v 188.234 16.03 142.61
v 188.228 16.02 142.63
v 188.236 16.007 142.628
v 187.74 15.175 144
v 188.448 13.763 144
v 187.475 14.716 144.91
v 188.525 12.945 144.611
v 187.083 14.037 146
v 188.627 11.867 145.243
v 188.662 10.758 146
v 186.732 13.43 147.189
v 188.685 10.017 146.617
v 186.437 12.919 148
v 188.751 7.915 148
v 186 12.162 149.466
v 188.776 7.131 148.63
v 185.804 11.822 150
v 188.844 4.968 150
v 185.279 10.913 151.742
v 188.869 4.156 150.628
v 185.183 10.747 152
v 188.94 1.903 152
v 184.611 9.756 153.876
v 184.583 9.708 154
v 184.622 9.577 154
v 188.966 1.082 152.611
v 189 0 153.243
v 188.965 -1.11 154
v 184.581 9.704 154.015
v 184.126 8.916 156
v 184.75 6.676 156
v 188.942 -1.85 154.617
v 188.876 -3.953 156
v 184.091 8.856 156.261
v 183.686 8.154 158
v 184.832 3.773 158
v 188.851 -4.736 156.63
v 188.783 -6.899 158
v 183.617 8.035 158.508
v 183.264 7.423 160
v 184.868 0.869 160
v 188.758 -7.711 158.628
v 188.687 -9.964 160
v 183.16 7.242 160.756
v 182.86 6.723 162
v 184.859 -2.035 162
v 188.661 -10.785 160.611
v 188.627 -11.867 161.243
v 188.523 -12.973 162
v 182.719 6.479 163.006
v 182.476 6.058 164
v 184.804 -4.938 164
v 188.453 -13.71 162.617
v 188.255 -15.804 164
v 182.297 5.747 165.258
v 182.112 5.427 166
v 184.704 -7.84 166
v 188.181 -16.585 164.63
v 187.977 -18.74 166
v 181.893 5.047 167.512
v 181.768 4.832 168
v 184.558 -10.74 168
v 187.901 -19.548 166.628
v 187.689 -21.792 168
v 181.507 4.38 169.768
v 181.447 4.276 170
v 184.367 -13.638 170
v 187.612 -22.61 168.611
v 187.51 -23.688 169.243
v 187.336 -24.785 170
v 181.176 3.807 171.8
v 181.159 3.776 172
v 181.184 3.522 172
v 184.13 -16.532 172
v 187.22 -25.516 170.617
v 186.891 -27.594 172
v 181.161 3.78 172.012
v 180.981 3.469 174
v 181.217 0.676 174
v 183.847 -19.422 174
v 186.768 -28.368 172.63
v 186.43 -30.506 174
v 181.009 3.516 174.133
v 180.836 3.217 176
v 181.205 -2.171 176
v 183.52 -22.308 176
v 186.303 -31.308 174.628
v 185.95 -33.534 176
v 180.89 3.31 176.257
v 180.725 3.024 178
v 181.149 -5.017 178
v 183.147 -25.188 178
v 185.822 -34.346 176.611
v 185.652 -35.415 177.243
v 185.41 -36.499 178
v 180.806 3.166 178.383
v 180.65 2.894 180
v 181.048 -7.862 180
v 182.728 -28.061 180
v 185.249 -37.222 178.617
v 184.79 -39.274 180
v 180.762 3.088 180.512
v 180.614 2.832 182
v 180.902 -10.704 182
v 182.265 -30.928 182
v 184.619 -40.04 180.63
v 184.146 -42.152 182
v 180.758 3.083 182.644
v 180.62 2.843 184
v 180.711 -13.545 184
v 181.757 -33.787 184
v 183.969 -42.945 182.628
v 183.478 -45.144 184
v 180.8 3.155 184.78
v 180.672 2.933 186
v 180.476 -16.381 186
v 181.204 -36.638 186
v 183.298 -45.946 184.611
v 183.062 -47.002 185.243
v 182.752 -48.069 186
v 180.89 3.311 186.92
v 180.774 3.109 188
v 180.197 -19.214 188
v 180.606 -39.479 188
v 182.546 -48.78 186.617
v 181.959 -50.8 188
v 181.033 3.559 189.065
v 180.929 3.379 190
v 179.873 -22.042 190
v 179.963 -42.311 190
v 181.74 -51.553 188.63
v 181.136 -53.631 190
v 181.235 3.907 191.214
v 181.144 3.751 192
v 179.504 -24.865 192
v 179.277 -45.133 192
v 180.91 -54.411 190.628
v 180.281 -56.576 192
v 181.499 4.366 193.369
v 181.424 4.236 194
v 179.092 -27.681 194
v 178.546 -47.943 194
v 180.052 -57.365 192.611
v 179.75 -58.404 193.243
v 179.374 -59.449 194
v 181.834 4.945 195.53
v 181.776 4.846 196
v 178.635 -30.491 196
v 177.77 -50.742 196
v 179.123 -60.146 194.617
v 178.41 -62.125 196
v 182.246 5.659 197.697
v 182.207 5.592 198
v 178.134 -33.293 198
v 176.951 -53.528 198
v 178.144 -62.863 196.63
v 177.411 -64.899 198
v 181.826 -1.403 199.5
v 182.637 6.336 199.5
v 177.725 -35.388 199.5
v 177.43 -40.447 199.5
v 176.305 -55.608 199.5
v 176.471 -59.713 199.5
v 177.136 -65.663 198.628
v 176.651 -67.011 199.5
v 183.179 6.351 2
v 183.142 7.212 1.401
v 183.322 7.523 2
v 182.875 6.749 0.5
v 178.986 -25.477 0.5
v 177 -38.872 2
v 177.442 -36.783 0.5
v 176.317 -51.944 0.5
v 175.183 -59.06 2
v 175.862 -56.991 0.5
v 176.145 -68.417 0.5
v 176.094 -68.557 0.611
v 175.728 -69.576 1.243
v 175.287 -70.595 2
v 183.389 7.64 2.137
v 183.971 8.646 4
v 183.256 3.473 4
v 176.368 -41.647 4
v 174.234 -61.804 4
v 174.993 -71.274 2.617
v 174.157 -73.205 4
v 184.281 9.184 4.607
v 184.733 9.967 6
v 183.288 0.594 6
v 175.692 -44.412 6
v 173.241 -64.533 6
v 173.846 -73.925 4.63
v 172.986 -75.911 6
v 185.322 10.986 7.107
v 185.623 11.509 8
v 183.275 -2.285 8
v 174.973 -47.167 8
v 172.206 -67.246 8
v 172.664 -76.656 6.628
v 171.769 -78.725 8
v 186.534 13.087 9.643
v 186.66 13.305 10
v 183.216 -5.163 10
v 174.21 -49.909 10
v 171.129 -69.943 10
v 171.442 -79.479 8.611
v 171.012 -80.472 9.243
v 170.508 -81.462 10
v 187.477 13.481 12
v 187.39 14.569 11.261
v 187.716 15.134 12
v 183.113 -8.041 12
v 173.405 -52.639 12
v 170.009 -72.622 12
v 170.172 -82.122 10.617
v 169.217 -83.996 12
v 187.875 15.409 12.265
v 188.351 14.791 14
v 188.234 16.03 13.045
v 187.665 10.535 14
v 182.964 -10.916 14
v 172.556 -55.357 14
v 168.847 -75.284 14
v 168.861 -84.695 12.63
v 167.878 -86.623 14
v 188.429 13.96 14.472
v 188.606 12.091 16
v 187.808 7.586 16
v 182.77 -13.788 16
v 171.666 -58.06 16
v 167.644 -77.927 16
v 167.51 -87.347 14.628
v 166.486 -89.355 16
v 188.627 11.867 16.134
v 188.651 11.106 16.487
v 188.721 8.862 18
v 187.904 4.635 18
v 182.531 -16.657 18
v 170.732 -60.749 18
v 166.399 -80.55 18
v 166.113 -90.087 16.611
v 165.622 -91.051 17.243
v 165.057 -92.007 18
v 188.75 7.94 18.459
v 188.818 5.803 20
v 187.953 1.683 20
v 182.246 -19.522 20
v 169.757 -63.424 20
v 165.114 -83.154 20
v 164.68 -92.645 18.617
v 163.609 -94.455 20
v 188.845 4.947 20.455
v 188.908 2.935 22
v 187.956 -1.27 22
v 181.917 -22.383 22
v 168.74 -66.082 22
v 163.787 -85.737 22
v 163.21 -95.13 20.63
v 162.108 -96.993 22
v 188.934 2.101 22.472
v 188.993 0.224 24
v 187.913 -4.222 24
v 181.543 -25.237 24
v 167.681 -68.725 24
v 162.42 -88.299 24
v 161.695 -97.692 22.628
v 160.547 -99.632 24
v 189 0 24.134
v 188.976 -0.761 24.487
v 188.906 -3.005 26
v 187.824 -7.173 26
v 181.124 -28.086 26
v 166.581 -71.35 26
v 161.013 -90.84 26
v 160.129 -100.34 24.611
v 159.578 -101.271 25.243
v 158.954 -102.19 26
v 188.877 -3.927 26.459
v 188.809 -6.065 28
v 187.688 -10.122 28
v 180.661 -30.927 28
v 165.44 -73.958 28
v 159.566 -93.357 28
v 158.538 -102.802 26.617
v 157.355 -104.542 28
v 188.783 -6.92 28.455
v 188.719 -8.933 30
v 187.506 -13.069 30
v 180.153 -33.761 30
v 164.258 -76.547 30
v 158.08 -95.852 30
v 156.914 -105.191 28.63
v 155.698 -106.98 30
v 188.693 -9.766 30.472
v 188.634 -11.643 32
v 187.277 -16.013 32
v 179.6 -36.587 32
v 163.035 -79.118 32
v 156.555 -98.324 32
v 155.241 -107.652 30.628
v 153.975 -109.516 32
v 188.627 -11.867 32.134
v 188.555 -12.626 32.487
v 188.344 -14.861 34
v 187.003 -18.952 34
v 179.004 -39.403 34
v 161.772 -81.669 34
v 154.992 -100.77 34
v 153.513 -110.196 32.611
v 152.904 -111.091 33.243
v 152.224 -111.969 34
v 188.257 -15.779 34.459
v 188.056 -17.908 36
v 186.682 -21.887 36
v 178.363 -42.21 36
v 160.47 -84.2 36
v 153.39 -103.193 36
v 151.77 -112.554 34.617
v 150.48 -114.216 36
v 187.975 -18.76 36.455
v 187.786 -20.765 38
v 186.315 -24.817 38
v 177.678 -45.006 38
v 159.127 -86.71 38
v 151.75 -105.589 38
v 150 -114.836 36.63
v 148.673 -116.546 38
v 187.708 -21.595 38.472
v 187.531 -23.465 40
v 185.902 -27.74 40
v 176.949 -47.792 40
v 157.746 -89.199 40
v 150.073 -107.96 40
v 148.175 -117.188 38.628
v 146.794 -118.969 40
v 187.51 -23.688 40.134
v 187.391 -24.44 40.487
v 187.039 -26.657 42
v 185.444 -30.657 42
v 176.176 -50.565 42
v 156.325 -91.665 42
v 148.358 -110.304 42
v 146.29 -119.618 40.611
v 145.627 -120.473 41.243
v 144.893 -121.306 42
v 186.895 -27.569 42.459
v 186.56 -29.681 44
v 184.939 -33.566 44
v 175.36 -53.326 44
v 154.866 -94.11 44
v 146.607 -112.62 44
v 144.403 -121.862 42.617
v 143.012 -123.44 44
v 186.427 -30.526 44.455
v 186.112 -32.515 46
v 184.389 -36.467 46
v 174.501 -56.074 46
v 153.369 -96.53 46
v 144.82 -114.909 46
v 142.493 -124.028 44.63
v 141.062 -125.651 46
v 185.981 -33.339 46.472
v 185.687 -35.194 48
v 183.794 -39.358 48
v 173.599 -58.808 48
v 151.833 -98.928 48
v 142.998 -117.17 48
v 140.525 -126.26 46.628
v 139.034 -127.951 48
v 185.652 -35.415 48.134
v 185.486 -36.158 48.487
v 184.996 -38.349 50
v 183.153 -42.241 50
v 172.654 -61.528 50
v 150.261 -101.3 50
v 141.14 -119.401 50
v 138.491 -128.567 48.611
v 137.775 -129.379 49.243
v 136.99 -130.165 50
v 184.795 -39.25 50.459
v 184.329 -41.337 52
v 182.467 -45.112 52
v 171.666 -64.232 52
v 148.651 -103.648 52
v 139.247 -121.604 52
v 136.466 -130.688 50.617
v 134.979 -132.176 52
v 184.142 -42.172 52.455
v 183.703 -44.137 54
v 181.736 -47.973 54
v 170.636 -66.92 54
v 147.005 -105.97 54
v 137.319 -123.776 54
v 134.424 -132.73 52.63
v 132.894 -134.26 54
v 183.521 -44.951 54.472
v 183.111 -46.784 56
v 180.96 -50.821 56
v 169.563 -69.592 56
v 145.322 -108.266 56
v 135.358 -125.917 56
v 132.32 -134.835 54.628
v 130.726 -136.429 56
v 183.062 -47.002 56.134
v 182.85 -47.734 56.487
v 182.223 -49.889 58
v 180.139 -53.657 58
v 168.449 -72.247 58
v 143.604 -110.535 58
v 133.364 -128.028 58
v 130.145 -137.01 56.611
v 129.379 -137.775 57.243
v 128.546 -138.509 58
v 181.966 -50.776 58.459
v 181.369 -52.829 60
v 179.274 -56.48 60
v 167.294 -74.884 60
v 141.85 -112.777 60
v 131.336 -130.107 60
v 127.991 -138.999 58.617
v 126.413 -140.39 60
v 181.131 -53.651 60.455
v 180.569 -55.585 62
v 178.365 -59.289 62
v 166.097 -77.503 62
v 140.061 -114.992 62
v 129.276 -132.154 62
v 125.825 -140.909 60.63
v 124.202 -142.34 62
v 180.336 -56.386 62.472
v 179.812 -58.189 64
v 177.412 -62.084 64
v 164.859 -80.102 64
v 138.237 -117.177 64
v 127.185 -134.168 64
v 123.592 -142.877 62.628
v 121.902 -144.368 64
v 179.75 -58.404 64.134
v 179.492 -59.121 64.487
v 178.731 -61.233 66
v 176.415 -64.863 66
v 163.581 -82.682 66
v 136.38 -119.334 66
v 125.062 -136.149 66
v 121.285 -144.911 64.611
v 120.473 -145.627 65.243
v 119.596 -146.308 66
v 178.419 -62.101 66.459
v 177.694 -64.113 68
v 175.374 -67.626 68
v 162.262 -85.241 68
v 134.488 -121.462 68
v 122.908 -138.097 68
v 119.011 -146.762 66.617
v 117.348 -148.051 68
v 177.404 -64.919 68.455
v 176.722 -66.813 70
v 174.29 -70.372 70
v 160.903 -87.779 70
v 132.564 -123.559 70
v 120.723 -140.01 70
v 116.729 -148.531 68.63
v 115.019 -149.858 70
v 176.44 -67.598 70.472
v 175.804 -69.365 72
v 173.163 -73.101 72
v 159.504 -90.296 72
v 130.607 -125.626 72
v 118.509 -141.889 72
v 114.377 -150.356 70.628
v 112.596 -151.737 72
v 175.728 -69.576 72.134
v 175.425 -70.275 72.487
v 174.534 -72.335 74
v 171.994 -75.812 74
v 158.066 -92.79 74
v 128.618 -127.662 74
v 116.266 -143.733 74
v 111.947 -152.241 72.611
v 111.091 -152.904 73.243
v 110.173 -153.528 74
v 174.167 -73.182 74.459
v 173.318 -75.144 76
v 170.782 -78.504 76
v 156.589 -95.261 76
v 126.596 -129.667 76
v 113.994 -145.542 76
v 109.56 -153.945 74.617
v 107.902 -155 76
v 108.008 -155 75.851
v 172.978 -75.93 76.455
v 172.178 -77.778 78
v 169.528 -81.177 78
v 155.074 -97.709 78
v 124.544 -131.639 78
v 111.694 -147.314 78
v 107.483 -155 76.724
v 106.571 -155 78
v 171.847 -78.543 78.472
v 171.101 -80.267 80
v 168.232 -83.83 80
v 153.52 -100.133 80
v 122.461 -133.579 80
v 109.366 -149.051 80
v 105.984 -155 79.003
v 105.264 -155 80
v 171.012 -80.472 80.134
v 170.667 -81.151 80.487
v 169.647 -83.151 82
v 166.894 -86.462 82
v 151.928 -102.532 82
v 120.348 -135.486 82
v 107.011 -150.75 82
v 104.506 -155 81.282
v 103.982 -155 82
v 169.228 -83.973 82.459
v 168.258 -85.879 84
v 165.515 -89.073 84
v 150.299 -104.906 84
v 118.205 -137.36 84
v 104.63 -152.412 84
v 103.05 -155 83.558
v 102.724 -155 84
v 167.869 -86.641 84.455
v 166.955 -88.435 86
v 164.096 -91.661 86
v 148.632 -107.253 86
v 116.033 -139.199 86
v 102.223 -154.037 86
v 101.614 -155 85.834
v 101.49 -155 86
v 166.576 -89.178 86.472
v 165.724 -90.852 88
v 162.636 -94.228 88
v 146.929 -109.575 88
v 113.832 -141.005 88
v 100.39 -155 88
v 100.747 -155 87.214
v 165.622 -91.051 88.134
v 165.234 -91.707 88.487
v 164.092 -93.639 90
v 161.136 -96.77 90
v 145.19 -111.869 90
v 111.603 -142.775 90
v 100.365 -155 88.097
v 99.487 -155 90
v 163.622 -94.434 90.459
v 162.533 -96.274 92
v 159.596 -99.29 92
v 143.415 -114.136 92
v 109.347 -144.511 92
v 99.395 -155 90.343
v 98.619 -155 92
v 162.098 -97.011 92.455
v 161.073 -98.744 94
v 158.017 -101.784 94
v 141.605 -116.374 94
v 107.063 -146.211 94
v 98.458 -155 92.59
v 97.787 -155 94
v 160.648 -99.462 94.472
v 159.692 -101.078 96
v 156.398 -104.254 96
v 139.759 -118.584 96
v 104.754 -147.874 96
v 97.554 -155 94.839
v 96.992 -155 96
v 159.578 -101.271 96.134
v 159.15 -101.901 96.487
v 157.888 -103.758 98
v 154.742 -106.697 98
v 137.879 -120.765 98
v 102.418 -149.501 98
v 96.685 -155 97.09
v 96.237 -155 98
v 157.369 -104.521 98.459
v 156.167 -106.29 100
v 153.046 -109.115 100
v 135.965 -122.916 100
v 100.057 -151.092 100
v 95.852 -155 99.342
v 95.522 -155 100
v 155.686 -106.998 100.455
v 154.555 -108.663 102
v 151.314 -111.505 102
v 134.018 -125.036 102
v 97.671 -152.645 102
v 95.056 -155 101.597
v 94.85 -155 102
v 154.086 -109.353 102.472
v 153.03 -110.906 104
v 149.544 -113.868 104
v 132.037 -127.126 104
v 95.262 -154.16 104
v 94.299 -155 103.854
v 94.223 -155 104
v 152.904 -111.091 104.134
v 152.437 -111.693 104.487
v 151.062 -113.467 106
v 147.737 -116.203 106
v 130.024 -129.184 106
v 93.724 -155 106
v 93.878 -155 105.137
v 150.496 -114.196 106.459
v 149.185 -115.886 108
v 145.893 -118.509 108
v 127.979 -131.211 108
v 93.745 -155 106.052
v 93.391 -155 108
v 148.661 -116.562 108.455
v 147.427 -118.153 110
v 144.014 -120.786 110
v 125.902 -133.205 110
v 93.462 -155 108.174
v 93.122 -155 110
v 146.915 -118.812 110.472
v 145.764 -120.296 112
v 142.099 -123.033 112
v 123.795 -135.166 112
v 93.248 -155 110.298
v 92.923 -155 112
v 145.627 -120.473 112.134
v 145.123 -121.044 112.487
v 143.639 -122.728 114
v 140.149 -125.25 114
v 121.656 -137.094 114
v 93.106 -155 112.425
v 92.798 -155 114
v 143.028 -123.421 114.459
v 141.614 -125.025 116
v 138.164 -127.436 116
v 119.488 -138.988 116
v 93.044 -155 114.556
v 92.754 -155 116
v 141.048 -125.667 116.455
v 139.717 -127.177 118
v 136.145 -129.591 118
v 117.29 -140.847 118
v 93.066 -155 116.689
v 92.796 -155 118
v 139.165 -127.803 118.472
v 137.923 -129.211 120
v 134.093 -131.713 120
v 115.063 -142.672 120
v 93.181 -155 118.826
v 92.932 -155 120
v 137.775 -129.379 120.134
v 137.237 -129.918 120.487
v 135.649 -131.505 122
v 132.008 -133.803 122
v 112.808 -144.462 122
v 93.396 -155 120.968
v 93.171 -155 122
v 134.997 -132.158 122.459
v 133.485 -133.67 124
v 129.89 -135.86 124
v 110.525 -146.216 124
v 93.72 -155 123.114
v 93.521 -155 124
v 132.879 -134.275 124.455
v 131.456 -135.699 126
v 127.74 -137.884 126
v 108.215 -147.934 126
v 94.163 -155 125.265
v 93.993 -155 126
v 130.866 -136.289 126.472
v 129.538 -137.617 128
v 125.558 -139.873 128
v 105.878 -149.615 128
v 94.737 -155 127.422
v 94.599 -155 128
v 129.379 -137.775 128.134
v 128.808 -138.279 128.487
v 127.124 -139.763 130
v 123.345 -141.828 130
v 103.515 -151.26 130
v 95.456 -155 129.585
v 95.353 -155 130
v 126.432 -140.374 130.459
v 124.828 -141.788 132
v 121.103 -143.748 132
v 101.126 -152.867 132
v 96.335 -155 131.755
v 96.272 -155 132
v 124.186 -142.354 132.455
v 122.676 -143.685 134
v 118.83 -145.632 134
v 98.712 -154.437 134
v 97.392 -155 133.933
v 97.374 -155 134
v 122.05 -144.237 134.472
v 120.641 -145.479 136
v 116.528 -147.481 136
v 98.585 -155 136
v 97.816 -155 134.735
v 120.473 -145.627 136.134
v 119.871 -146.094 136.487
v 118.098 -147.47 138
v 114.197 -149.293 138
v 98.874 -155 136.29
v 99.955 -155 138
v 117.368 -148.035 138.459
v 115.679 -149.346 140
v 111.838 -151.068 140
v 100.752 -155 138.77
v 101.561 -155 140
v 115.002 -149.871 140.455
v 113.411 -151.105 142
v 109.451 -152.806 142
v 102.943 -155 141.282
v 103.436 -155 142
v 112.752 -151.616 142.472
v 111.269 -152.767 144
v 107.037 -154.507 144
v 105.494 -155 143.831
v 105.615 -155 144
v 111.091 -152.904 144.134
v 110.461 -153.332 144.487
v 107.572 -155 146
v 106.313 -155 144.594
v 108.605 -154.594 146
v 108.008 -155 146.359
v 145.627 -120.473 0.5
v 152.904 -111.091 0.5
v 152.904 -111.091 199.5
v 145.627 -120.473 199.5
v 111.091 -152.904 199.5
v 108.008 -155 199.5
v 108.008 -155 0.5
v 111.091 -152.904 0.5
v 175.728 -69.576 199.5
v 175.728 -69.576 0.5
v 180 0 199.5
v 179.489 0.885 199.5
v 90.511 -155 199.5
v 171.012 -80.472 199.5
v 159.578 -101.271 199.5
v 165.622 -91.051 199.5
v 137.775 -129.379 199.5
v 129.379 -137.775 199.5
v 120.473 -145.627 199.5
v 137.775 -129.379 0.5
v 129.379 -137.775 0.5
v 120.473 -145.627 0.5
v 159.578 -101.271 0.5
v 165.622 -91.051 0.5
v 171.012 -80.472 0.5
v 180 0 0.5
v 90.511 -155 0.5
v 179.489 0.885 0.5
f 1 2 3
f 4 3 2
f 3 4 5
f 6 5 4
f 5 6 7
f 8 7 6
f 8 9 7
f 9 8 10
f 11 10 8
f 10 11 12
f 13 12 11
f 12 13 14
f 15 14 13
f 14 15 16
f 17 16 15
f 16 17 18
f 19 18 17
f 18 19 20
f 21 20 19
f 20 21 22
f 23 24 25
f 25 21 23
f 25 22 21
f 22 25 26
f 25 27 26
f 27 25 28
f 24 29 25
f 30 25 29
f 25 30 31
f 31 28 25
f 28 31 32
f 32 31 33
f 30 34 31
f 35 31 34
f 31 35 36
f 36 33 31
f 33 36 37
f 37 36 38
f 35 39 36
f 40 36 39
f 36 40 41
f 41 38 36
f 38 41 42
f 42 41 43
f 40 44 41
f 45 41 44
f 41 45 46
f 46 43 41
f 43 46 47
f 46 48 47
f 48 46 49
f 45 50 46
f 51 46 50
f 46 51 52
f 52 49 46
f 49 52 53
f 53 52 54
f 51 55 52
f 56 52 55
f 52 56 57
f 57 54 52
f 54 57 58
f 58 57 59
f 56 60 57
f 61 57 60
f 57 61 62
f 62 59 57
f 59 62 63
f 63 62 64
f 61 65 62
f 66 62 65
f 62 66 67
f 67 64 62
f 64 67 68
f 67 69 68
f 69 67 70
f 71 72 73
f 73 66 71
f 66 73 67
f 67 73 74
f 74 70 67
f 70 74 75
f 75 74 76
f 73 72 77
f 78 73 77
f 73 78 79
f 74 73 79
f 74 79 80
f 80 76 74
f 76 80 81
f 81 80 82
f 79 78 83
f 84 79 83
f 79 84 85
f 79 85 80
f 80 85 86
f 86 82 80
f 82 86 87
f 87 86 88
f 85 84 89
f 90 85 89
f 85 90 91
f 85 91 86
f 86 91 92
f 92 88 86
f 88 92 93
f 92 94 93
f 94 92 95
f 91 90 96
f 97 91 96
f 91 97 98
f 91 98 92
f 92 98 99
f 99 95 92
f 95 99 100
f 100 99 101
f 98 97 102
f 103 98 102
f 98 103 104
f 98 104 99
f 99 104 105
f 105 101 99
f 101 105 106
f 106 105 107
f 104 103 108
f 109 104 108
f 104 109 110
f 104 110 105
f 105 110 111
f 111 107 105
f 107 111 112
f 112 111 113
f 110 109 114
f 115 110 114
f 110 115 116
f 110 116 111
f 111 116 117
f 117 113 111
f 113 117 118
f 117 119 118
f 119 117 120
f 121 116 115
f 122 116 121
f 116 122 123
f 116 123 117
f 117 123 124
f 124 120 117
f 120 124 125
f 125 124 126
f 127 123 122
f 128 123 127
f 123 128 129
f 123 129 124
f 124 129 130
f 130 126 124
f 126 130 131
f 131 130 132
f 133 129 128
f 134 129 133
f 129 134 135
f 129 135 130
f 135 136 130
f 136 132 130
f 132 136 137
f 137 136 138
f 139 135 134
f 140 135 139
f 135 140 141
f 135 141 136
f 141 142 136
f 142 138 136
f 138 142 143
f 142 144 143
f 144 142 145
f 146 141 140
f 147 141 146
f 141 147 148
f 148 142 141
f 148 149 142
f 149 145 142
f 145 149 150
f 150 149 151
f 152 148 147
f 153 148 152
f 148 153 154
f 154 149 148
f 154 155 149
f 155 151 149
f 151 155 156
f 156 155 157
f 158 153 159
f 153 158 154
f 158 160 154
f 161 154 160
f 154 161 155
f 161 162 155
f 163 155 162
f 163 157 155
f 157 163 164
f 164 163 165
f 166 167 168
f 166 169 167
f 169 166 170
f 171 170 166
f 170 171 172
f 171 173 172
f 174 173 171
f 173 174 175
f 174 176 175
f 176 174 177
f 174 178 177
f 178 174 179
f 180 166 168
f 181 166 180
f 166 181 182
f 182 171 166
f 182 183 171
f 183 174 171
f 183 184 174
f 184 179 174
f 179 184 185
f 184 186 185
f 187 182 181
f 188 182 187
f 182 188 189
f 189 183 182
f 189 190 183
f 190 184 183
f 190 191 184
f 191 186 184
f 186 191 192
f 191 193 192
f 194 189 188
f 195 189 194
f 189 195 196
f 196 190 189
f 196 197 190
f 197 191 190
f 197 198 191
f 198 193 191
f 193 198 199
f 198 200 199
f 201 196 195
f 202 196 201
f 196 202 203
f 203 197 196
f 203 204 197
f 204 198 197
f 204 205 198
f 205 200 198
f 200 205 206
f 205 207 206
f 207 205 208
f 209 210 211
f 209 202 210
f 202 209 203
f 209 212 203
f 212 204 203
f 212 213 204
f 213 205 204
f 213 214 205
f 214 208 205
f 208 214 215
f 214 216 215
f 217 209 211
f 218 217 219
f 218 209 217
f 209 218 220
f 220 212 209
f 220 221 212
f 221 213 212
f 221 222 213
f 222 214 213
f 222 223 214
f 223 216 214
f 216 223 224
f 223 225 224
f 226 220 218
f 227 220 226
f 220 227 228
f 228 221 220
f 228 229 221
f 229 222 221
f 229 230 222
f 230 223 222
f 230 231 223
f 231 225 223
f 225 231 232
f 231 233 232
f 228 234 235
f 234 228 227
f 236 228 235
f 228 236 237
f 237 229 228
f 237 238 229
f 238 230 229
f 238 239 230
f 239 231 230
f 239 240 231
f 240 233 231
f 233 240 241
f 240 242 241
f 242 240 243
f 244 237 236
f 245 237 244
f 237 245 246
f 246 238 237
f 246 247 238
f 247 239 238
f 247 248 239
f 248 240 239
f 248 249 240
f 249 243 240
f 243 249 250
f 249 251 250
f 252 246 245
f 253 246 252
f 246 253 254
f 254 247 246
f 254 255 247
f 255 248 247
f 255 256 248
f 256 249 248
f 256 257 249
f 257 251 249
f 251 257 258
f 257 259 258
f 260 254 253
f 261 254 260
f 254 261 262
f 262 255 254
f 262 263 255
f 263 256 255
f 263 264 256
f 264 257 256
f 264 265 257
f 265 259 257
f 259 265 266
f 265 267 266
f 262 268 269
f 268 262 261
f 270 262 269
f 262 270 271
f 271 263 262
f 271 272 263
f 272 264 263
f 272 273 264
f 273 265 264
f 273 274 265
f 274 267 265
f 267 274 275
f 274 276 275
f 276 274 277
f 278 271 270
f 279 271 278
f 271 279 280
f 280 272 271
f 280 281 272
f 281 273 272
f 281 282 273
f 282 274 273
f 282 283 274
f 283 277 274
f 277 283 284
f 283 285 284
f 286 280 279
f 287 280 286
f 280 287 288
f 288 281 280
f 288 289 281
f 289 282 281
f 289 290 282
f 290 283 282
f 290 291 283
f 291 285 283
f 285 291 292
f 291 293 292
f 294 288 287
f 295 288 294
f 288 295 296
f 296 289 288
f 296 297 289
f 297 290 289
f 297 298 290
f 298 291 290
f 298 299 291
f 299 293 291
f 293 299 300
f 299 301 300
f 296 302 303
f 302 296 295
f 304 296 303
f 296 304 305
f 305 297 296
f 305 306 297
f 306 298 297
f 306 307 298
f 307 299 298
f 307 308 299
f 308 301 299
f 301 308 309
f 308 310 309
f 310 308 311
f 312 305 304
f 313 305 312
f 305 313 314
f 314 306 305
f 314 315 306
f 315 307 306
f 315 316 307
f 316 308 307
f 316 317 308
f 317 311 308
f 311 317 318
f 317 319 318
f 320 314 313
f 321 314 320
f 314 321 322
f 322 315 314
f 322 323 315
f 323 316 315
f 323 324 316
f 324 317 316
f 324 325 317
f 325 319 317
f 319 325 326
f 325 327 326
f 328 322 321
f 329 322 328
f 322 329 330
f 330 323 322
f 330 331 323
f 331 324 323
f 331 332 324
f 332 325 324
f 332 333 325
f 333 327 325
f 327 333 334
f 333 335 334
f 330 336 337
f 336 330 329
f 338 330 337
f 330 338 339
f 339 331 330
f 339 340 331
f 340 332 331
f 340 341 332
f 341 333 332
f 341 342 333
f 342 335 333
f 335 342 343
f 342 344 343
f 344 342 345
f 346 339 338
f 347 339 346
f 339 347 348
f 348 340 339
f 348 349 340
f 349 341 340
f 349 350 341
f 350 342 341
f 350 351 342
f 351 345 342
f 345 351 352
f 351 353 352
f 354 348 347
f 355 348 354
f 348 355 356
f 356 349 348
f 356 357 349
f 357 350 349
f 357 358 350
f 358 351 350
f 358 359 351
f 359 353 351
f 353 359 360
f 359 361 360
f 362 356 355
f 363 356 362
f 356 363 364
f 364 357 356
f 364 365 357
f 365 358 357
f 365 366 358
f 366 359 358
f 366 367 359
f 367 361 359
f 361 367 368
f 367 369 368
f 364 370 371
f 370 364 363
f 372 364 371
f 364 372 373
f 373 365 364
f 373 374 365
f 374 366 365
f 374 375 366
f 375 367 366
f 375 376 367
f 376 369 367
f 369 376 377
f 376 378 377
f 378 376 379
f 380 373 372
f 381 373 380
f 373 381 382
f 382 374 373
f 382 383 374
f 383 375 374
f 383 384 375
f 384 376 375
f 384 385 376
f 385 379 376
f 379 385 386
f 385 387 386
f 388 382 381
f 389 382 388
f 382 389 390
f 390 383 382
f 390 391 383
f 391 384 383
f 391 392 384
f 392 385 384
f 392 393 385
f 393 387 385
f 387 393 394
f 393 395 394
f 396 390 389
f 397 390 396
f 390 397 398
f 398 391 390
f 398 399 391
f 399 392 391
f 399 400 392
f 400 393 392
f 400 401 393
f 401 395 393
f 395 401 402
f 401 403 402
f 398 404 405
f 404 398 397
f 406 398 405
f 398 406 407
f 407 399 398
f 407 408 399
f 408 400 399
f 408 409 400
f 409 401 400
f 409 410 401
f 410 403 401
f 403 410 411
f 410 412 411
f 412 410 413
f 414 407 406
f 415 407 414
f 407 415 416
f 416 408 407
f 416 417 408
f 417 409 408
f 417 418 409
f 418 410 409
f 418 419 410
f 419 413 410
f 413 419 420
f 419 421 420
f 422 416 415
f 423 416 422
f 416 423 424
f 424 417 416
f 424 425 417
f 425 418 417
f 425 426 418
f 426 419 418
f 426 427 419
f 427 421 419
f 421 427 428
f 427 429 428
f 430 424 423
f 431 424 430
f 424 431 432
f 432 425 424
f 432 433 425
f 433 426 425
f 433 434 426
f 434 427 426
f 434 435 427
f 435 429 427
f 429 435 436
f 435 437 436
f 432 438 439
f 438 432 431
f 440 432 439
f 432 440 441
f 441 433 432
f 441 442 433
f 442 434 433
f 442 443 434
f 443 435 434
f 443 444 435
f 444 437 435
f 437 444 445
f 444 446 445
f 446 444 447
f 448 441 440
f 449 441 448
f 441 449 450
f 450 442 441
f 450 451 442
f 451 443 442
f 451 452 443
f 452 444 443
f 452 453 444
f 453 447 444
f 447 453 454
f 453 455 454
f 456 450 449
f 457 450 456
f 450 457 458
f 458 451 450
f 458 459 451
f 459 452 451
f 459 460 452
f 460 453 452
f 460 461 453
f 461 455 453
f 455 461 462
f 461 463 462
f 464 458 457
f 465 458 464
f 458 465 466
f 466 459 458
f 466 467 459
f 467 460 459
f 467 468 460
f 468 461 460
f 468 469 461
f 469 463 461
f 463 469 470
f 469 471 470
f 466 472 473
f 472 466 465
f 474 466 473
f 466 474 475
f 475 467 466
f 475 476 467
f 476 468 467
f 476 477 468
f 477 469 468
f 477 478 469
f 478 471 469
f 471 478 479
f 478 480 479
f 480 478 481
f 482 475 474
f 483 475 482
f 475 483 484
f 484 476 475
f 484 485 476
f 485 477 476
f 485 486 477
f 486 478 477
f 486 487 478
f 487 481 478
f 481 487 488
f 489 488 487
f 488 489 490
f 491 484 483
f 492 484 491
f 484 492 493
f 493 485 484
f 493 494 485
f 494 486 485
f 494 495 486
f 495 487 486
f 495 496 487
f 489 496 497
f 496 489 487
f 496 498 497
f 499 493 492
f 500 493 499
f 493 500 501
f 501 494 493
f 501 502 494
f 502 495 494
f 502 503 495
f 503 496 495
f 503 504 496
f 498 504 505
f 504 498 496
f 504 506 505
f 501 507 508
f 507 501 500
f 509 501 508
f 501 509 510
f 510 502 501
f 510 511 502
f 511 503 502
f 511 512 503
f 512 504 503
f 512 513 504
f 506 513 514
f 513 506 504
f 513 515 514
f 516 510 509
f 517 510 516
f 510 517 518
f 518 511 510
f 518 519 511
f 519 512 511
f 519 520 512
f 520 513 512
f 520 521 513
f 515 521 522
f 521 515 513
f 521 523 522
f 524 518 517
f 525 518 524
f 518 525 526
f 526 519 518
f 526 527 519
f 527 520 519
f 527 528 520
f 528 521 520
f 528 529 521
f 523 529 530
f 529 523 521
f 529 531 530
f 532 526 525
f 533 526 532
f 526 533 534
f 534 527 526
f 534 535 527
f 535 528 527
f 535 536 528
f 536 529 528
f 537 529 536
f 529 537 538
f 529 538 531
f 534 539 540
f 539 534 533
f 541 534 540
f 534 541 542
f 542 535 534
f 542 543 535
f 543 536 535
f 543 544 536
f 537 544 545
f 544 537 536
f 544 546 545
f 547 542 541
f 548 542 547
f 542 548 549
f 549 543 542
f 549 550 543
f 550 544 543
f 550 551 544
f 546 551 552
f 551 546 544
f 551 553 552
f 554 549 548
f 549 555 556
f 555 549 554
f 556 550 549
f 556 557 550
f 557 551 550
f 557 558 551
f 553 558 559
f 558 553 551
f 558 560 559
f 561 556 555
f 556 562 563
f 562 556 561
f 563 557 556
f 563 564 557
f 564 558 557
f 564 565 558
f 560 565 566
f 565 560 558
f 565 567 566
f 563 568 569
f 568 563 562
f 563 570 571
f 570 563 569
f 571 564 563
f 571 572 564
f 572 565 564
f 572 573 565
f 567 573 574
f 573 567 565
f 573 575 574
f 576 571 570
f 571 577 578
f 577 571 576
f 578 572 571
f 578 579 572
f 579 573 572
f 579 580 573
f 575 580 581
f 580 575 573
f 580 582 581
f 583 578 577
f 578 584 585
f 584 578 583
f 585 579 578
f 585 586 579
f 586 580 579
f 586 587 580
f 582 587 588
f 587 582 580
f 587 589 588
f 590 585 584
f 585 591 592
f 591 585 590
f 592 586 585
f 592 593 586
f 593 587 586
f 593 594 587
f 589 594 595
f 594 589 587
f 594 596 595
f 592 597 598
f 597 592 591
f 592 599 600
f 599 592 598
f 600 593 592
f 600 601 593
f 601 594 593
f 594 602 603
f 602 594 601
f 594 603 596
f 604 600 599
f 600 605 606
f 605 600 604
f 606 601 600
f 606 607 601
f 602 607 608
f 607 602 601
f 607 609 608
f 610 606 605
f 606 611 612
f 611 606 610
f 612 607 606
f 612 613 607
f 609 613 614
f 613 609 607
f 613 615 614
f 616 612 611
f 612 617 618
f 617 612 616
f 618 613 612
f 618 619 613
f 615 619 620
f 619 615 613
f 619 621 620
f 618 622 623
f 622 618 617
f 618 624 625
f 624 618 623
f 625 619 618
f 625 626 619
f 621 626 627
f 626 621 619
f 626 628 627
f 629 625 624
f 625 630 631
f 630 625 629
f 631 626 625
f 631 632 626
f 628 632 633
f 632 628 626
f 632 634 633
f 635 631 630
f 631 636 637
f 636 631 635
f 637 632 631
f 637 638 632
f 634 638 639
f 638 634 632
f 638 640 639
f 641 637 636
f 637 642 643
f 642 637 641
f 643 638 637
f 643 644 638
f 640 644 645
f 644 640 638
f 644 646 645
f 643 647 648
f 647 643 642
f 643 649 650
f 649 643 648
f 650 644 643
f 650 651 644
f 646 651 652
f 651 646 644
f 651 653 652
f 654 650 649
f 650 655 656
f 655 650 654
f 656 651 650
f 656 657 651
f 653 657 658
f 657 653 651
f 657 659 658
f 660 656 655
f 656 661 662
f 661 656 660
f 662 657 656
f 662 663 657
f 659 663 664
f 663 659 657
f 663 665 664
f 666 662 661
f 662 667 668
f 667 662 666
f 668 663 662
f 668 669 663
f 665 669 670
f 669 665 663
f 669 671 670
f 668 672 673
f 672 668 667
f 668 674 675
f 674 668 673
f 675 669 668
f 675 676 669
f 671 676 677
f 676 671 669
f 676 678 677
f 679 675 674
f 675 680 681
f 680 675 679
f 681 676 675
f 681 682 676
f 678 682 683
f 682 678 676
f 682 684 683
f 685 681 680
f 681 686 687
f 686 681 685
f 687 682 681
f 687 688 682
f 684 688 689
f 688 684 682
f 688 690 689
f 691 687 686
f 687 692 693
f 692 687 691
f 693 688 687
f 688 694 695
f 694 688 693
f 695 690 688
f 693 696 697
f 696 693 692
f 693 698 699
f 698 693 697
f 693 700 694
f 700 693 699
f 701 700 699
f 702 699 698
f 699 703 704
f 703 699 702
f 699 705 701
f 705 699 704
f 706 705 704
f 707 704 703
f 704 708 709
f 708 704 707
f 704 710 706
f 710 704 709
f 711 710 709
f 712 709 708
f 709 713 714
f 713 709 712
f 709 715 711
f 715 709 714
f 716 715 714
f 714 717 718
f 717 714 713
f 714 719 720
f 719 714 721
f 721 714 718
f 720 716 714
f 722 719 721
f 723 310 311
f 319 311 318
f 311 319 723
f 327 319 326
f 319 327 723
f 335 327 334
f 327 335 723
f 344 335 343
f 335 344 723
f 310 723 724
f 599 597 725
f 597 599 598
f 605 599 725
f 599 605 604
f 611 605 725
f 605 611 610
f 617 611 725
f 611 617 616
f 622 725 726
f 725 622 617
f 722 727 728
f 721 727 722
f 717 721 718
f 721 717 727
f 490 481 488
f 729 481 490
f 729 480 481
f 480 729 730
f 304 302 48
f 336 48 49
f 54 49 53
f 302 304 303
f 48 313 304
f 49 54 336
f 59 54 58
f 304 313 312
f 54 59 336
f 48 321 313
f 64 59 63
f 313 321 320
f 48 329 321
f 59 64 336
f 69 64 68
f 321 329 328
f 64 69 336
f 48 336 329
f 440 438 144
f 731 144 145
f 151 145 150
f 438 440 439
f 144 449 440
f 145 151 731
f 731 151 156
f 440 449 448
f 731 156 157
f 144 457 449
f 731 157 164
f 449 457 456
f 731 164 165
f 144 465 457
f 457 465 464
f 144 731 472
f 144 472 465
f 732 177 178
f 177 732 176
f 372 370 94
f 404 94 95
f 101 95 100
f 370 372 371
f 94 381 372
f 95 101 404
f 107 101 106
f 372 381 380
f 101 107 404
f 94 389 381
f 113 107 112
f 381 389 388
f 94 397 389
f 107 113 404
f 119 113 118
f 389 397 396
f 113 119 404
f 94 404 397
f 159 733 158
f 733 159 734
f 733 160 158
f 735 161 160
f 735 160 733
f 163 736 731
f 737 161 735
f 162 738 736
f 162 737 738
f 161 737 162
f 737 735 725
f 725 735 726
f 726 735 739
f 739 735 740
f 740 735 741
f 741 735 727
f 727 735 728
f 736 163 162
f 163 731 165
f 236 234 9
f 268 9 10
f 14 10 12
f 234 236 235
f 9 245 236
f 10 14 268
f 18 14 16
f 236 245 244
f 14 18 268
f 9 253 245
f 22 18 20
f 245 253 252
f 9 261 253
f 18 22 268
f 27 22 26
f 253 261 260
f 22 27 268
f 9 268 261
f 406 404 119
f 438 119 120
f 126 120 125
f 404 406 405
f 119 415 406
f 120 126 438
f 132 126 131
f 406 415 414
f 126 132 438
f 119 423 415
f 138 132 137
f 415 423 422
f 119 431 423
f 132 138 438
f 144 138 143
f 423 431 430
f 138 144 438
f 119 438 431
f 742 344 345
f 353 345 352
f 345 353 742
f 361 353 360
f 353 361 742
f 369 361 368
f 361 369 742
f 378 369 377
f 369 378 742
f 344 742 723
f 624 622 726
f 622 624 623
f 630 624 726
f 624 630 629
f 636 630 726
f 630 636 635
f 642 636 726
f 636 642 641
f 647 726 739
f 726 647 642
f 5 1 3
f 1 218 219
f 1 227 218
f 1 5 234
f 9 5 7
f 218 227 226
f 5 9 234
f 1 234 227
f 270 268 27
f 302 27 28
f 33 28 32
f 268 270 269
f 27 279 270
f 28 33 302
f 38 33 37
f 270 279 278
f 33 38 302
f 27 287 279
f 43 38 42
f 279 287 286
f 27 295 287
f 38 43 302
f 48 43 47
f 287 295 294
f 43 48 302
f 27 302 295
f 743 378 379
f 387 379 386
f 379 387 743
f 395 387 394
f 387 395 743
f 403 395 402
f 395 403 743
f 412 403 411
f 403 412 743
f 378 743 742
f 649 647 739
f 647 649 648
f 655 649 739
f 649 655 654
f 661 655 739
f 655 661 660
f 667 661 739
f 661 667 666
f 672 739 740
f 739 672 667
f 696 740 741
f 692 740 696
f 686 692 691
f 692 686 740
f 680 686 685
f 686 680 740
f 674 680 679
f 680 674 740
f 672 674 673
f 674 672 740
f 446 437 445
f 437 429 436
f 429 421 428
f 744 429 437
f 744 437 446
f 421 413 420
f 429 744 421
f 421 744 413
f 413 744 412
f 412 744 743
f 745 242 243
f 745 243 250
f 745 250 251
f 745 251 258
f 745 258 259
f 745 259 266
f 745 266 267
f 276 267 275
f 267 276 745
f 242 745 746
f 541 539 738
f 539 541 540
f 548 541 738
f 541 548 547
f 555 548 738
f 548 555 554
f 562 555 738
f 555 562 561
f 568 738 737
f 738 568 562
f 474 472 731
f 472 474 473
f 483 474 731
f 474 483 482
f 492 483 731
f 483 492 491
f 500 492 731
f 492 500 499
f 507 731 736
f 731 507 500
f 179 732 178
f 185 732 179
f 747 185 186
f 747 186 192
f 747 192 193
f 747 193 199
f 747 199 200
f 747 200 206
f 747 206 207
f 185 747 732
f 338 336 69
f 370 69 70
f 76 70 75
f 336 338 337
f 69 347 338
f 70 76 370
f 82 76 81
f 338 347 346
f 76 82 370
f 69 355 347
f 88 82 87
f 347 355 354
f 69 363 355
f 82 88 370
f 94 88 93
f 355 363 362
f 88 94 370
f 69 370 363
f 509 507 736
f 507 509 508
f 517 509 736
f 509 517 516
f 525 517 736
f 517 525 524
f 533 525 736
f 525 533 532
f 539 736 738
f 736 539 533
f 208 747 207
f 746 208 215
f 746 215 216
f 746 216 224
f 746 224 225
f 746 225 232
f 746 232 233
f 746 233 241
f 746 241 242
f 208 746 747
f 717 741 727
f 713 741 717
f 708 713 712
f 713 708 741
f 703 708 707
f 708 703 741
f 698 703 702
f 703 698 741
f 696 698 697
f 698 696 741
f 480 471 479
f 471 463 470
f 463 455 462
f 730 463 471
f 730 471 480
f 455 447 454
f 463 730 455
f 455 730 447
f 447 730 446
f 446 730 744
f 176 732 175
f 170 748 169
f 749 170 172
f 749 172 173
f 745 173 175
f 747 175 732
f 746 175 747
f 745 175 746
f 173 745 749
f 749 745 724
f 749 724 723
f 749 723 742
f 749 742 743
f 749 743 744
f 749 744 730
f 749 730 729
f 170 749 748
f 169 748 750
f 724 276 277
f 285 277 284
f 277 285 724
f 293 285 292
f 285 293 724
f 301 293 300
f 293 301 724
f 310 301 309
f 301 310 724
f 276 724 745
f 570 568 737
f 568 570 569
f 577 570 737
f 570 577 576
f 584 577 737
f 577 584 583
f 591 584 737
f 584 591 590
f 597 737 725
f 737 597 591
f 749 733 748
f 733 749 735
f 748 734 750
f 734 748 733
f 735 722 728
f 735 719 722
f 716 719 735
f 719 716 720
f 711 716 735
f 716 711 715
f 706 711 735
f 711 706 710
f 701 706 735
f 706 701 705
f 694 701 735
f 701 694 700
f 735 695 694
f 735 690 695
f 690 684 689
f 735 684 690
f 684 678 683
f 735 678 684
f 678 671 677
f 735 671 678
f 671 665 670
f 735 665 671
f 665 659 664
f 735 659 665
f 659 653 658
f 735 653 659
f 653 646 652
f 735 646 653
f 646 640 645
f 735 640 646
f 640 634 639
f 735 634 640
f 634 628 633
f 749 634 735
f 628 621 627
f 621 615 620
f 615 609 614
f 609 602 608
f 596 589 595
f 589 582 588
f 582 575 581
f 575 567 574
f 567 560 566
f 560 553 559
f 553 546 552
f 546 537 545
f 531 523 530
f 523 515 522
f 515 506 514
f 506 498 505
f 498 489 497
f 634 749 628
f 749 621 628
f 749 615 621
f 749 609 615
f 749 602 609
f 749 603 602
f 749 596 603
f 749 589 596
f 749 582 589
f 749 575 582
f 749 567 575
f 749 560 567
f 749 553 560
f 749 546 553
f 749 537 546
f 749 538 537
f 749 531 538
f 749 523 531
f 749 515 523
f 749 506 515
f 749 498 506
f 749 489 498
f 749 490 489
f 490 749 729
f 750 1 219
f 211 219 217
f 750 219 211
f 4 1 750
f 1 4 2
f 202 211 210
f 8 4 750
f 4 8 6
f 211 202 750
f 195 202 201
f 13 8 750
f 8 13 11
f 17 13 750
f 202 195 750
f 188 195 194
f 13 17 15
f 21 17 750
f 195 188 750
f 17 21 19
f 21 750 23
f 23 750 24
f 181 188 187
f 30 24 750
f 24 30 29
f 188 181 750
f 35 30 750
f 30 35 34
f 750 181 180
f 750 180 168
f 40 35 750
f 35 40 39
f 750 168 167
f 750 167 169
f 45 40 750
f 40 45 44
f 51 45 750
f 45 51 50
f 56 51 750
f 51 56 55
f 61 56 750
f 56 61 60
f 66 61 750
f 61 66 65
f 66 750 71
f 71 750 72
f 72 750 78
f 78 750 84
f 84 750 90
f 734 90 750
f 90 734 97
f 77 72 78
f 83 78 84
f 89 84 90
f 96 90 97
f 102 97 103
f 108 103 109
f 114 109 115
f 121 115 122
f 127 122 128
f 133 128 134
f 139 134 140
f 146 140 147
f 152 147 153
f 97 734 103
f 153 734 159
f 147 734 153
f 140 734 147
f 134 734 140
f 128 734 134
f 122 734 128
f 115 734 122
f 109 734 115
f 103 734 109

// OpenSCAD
intersection() {
difference() {
translate([0,0,100]) {cylinder (r = 189, h = 199, $fn = 100, center = true);}

union() {
linear_extrude(height = 200, twist = 90, $fn = 400) translate([-50,-100,0]){import(file = "wing.dxf", center = false, $fn = 100);} rotate([0,30,0]);

rotate([0,0,90]) {linear_extrude(height = 200, twist = 90, $fn = 400) translate([-50,-100,0]){import(file = "wing.dxf", center = false, $fn = 100);} rotate([0,30,0]);}

rotate([0,0,180]) {linear_extrude(height = 200, twist = 90, $fn = 400) translate([-50,-100,0]){import(file = "wing.dxf", center = false, $fn = 100);} rotate([0,30,0]);}

rotate([0,0,270]) {linear_extrude(height = 200, twist = 90, $fn = 400) translate([-50,-100,0]){import(file = "wing.dxf", center = false, $fn = 100);} rotate([0,30,0]);}
}

cylinder(h = 400, r = 180, center = true, $fn = 6);

translate ([0,175,100]){cube ([400,40,200], center = true);}

rotate([0,0,60]) {translate ([0,175,100]){cube ([400,40,200], center = true);}}

rotate([0,0,120]) {translate ([0,175,100]){cube ([400,40,200], center = true);}}

rotate([0,0,180]) {translate ([0,175,100]){cube ([400,40,200], center = true);}}
}


rotate([0,0,240]) {translate ([0,175,100]){cube ([400,40,200], center = true);}}
}
